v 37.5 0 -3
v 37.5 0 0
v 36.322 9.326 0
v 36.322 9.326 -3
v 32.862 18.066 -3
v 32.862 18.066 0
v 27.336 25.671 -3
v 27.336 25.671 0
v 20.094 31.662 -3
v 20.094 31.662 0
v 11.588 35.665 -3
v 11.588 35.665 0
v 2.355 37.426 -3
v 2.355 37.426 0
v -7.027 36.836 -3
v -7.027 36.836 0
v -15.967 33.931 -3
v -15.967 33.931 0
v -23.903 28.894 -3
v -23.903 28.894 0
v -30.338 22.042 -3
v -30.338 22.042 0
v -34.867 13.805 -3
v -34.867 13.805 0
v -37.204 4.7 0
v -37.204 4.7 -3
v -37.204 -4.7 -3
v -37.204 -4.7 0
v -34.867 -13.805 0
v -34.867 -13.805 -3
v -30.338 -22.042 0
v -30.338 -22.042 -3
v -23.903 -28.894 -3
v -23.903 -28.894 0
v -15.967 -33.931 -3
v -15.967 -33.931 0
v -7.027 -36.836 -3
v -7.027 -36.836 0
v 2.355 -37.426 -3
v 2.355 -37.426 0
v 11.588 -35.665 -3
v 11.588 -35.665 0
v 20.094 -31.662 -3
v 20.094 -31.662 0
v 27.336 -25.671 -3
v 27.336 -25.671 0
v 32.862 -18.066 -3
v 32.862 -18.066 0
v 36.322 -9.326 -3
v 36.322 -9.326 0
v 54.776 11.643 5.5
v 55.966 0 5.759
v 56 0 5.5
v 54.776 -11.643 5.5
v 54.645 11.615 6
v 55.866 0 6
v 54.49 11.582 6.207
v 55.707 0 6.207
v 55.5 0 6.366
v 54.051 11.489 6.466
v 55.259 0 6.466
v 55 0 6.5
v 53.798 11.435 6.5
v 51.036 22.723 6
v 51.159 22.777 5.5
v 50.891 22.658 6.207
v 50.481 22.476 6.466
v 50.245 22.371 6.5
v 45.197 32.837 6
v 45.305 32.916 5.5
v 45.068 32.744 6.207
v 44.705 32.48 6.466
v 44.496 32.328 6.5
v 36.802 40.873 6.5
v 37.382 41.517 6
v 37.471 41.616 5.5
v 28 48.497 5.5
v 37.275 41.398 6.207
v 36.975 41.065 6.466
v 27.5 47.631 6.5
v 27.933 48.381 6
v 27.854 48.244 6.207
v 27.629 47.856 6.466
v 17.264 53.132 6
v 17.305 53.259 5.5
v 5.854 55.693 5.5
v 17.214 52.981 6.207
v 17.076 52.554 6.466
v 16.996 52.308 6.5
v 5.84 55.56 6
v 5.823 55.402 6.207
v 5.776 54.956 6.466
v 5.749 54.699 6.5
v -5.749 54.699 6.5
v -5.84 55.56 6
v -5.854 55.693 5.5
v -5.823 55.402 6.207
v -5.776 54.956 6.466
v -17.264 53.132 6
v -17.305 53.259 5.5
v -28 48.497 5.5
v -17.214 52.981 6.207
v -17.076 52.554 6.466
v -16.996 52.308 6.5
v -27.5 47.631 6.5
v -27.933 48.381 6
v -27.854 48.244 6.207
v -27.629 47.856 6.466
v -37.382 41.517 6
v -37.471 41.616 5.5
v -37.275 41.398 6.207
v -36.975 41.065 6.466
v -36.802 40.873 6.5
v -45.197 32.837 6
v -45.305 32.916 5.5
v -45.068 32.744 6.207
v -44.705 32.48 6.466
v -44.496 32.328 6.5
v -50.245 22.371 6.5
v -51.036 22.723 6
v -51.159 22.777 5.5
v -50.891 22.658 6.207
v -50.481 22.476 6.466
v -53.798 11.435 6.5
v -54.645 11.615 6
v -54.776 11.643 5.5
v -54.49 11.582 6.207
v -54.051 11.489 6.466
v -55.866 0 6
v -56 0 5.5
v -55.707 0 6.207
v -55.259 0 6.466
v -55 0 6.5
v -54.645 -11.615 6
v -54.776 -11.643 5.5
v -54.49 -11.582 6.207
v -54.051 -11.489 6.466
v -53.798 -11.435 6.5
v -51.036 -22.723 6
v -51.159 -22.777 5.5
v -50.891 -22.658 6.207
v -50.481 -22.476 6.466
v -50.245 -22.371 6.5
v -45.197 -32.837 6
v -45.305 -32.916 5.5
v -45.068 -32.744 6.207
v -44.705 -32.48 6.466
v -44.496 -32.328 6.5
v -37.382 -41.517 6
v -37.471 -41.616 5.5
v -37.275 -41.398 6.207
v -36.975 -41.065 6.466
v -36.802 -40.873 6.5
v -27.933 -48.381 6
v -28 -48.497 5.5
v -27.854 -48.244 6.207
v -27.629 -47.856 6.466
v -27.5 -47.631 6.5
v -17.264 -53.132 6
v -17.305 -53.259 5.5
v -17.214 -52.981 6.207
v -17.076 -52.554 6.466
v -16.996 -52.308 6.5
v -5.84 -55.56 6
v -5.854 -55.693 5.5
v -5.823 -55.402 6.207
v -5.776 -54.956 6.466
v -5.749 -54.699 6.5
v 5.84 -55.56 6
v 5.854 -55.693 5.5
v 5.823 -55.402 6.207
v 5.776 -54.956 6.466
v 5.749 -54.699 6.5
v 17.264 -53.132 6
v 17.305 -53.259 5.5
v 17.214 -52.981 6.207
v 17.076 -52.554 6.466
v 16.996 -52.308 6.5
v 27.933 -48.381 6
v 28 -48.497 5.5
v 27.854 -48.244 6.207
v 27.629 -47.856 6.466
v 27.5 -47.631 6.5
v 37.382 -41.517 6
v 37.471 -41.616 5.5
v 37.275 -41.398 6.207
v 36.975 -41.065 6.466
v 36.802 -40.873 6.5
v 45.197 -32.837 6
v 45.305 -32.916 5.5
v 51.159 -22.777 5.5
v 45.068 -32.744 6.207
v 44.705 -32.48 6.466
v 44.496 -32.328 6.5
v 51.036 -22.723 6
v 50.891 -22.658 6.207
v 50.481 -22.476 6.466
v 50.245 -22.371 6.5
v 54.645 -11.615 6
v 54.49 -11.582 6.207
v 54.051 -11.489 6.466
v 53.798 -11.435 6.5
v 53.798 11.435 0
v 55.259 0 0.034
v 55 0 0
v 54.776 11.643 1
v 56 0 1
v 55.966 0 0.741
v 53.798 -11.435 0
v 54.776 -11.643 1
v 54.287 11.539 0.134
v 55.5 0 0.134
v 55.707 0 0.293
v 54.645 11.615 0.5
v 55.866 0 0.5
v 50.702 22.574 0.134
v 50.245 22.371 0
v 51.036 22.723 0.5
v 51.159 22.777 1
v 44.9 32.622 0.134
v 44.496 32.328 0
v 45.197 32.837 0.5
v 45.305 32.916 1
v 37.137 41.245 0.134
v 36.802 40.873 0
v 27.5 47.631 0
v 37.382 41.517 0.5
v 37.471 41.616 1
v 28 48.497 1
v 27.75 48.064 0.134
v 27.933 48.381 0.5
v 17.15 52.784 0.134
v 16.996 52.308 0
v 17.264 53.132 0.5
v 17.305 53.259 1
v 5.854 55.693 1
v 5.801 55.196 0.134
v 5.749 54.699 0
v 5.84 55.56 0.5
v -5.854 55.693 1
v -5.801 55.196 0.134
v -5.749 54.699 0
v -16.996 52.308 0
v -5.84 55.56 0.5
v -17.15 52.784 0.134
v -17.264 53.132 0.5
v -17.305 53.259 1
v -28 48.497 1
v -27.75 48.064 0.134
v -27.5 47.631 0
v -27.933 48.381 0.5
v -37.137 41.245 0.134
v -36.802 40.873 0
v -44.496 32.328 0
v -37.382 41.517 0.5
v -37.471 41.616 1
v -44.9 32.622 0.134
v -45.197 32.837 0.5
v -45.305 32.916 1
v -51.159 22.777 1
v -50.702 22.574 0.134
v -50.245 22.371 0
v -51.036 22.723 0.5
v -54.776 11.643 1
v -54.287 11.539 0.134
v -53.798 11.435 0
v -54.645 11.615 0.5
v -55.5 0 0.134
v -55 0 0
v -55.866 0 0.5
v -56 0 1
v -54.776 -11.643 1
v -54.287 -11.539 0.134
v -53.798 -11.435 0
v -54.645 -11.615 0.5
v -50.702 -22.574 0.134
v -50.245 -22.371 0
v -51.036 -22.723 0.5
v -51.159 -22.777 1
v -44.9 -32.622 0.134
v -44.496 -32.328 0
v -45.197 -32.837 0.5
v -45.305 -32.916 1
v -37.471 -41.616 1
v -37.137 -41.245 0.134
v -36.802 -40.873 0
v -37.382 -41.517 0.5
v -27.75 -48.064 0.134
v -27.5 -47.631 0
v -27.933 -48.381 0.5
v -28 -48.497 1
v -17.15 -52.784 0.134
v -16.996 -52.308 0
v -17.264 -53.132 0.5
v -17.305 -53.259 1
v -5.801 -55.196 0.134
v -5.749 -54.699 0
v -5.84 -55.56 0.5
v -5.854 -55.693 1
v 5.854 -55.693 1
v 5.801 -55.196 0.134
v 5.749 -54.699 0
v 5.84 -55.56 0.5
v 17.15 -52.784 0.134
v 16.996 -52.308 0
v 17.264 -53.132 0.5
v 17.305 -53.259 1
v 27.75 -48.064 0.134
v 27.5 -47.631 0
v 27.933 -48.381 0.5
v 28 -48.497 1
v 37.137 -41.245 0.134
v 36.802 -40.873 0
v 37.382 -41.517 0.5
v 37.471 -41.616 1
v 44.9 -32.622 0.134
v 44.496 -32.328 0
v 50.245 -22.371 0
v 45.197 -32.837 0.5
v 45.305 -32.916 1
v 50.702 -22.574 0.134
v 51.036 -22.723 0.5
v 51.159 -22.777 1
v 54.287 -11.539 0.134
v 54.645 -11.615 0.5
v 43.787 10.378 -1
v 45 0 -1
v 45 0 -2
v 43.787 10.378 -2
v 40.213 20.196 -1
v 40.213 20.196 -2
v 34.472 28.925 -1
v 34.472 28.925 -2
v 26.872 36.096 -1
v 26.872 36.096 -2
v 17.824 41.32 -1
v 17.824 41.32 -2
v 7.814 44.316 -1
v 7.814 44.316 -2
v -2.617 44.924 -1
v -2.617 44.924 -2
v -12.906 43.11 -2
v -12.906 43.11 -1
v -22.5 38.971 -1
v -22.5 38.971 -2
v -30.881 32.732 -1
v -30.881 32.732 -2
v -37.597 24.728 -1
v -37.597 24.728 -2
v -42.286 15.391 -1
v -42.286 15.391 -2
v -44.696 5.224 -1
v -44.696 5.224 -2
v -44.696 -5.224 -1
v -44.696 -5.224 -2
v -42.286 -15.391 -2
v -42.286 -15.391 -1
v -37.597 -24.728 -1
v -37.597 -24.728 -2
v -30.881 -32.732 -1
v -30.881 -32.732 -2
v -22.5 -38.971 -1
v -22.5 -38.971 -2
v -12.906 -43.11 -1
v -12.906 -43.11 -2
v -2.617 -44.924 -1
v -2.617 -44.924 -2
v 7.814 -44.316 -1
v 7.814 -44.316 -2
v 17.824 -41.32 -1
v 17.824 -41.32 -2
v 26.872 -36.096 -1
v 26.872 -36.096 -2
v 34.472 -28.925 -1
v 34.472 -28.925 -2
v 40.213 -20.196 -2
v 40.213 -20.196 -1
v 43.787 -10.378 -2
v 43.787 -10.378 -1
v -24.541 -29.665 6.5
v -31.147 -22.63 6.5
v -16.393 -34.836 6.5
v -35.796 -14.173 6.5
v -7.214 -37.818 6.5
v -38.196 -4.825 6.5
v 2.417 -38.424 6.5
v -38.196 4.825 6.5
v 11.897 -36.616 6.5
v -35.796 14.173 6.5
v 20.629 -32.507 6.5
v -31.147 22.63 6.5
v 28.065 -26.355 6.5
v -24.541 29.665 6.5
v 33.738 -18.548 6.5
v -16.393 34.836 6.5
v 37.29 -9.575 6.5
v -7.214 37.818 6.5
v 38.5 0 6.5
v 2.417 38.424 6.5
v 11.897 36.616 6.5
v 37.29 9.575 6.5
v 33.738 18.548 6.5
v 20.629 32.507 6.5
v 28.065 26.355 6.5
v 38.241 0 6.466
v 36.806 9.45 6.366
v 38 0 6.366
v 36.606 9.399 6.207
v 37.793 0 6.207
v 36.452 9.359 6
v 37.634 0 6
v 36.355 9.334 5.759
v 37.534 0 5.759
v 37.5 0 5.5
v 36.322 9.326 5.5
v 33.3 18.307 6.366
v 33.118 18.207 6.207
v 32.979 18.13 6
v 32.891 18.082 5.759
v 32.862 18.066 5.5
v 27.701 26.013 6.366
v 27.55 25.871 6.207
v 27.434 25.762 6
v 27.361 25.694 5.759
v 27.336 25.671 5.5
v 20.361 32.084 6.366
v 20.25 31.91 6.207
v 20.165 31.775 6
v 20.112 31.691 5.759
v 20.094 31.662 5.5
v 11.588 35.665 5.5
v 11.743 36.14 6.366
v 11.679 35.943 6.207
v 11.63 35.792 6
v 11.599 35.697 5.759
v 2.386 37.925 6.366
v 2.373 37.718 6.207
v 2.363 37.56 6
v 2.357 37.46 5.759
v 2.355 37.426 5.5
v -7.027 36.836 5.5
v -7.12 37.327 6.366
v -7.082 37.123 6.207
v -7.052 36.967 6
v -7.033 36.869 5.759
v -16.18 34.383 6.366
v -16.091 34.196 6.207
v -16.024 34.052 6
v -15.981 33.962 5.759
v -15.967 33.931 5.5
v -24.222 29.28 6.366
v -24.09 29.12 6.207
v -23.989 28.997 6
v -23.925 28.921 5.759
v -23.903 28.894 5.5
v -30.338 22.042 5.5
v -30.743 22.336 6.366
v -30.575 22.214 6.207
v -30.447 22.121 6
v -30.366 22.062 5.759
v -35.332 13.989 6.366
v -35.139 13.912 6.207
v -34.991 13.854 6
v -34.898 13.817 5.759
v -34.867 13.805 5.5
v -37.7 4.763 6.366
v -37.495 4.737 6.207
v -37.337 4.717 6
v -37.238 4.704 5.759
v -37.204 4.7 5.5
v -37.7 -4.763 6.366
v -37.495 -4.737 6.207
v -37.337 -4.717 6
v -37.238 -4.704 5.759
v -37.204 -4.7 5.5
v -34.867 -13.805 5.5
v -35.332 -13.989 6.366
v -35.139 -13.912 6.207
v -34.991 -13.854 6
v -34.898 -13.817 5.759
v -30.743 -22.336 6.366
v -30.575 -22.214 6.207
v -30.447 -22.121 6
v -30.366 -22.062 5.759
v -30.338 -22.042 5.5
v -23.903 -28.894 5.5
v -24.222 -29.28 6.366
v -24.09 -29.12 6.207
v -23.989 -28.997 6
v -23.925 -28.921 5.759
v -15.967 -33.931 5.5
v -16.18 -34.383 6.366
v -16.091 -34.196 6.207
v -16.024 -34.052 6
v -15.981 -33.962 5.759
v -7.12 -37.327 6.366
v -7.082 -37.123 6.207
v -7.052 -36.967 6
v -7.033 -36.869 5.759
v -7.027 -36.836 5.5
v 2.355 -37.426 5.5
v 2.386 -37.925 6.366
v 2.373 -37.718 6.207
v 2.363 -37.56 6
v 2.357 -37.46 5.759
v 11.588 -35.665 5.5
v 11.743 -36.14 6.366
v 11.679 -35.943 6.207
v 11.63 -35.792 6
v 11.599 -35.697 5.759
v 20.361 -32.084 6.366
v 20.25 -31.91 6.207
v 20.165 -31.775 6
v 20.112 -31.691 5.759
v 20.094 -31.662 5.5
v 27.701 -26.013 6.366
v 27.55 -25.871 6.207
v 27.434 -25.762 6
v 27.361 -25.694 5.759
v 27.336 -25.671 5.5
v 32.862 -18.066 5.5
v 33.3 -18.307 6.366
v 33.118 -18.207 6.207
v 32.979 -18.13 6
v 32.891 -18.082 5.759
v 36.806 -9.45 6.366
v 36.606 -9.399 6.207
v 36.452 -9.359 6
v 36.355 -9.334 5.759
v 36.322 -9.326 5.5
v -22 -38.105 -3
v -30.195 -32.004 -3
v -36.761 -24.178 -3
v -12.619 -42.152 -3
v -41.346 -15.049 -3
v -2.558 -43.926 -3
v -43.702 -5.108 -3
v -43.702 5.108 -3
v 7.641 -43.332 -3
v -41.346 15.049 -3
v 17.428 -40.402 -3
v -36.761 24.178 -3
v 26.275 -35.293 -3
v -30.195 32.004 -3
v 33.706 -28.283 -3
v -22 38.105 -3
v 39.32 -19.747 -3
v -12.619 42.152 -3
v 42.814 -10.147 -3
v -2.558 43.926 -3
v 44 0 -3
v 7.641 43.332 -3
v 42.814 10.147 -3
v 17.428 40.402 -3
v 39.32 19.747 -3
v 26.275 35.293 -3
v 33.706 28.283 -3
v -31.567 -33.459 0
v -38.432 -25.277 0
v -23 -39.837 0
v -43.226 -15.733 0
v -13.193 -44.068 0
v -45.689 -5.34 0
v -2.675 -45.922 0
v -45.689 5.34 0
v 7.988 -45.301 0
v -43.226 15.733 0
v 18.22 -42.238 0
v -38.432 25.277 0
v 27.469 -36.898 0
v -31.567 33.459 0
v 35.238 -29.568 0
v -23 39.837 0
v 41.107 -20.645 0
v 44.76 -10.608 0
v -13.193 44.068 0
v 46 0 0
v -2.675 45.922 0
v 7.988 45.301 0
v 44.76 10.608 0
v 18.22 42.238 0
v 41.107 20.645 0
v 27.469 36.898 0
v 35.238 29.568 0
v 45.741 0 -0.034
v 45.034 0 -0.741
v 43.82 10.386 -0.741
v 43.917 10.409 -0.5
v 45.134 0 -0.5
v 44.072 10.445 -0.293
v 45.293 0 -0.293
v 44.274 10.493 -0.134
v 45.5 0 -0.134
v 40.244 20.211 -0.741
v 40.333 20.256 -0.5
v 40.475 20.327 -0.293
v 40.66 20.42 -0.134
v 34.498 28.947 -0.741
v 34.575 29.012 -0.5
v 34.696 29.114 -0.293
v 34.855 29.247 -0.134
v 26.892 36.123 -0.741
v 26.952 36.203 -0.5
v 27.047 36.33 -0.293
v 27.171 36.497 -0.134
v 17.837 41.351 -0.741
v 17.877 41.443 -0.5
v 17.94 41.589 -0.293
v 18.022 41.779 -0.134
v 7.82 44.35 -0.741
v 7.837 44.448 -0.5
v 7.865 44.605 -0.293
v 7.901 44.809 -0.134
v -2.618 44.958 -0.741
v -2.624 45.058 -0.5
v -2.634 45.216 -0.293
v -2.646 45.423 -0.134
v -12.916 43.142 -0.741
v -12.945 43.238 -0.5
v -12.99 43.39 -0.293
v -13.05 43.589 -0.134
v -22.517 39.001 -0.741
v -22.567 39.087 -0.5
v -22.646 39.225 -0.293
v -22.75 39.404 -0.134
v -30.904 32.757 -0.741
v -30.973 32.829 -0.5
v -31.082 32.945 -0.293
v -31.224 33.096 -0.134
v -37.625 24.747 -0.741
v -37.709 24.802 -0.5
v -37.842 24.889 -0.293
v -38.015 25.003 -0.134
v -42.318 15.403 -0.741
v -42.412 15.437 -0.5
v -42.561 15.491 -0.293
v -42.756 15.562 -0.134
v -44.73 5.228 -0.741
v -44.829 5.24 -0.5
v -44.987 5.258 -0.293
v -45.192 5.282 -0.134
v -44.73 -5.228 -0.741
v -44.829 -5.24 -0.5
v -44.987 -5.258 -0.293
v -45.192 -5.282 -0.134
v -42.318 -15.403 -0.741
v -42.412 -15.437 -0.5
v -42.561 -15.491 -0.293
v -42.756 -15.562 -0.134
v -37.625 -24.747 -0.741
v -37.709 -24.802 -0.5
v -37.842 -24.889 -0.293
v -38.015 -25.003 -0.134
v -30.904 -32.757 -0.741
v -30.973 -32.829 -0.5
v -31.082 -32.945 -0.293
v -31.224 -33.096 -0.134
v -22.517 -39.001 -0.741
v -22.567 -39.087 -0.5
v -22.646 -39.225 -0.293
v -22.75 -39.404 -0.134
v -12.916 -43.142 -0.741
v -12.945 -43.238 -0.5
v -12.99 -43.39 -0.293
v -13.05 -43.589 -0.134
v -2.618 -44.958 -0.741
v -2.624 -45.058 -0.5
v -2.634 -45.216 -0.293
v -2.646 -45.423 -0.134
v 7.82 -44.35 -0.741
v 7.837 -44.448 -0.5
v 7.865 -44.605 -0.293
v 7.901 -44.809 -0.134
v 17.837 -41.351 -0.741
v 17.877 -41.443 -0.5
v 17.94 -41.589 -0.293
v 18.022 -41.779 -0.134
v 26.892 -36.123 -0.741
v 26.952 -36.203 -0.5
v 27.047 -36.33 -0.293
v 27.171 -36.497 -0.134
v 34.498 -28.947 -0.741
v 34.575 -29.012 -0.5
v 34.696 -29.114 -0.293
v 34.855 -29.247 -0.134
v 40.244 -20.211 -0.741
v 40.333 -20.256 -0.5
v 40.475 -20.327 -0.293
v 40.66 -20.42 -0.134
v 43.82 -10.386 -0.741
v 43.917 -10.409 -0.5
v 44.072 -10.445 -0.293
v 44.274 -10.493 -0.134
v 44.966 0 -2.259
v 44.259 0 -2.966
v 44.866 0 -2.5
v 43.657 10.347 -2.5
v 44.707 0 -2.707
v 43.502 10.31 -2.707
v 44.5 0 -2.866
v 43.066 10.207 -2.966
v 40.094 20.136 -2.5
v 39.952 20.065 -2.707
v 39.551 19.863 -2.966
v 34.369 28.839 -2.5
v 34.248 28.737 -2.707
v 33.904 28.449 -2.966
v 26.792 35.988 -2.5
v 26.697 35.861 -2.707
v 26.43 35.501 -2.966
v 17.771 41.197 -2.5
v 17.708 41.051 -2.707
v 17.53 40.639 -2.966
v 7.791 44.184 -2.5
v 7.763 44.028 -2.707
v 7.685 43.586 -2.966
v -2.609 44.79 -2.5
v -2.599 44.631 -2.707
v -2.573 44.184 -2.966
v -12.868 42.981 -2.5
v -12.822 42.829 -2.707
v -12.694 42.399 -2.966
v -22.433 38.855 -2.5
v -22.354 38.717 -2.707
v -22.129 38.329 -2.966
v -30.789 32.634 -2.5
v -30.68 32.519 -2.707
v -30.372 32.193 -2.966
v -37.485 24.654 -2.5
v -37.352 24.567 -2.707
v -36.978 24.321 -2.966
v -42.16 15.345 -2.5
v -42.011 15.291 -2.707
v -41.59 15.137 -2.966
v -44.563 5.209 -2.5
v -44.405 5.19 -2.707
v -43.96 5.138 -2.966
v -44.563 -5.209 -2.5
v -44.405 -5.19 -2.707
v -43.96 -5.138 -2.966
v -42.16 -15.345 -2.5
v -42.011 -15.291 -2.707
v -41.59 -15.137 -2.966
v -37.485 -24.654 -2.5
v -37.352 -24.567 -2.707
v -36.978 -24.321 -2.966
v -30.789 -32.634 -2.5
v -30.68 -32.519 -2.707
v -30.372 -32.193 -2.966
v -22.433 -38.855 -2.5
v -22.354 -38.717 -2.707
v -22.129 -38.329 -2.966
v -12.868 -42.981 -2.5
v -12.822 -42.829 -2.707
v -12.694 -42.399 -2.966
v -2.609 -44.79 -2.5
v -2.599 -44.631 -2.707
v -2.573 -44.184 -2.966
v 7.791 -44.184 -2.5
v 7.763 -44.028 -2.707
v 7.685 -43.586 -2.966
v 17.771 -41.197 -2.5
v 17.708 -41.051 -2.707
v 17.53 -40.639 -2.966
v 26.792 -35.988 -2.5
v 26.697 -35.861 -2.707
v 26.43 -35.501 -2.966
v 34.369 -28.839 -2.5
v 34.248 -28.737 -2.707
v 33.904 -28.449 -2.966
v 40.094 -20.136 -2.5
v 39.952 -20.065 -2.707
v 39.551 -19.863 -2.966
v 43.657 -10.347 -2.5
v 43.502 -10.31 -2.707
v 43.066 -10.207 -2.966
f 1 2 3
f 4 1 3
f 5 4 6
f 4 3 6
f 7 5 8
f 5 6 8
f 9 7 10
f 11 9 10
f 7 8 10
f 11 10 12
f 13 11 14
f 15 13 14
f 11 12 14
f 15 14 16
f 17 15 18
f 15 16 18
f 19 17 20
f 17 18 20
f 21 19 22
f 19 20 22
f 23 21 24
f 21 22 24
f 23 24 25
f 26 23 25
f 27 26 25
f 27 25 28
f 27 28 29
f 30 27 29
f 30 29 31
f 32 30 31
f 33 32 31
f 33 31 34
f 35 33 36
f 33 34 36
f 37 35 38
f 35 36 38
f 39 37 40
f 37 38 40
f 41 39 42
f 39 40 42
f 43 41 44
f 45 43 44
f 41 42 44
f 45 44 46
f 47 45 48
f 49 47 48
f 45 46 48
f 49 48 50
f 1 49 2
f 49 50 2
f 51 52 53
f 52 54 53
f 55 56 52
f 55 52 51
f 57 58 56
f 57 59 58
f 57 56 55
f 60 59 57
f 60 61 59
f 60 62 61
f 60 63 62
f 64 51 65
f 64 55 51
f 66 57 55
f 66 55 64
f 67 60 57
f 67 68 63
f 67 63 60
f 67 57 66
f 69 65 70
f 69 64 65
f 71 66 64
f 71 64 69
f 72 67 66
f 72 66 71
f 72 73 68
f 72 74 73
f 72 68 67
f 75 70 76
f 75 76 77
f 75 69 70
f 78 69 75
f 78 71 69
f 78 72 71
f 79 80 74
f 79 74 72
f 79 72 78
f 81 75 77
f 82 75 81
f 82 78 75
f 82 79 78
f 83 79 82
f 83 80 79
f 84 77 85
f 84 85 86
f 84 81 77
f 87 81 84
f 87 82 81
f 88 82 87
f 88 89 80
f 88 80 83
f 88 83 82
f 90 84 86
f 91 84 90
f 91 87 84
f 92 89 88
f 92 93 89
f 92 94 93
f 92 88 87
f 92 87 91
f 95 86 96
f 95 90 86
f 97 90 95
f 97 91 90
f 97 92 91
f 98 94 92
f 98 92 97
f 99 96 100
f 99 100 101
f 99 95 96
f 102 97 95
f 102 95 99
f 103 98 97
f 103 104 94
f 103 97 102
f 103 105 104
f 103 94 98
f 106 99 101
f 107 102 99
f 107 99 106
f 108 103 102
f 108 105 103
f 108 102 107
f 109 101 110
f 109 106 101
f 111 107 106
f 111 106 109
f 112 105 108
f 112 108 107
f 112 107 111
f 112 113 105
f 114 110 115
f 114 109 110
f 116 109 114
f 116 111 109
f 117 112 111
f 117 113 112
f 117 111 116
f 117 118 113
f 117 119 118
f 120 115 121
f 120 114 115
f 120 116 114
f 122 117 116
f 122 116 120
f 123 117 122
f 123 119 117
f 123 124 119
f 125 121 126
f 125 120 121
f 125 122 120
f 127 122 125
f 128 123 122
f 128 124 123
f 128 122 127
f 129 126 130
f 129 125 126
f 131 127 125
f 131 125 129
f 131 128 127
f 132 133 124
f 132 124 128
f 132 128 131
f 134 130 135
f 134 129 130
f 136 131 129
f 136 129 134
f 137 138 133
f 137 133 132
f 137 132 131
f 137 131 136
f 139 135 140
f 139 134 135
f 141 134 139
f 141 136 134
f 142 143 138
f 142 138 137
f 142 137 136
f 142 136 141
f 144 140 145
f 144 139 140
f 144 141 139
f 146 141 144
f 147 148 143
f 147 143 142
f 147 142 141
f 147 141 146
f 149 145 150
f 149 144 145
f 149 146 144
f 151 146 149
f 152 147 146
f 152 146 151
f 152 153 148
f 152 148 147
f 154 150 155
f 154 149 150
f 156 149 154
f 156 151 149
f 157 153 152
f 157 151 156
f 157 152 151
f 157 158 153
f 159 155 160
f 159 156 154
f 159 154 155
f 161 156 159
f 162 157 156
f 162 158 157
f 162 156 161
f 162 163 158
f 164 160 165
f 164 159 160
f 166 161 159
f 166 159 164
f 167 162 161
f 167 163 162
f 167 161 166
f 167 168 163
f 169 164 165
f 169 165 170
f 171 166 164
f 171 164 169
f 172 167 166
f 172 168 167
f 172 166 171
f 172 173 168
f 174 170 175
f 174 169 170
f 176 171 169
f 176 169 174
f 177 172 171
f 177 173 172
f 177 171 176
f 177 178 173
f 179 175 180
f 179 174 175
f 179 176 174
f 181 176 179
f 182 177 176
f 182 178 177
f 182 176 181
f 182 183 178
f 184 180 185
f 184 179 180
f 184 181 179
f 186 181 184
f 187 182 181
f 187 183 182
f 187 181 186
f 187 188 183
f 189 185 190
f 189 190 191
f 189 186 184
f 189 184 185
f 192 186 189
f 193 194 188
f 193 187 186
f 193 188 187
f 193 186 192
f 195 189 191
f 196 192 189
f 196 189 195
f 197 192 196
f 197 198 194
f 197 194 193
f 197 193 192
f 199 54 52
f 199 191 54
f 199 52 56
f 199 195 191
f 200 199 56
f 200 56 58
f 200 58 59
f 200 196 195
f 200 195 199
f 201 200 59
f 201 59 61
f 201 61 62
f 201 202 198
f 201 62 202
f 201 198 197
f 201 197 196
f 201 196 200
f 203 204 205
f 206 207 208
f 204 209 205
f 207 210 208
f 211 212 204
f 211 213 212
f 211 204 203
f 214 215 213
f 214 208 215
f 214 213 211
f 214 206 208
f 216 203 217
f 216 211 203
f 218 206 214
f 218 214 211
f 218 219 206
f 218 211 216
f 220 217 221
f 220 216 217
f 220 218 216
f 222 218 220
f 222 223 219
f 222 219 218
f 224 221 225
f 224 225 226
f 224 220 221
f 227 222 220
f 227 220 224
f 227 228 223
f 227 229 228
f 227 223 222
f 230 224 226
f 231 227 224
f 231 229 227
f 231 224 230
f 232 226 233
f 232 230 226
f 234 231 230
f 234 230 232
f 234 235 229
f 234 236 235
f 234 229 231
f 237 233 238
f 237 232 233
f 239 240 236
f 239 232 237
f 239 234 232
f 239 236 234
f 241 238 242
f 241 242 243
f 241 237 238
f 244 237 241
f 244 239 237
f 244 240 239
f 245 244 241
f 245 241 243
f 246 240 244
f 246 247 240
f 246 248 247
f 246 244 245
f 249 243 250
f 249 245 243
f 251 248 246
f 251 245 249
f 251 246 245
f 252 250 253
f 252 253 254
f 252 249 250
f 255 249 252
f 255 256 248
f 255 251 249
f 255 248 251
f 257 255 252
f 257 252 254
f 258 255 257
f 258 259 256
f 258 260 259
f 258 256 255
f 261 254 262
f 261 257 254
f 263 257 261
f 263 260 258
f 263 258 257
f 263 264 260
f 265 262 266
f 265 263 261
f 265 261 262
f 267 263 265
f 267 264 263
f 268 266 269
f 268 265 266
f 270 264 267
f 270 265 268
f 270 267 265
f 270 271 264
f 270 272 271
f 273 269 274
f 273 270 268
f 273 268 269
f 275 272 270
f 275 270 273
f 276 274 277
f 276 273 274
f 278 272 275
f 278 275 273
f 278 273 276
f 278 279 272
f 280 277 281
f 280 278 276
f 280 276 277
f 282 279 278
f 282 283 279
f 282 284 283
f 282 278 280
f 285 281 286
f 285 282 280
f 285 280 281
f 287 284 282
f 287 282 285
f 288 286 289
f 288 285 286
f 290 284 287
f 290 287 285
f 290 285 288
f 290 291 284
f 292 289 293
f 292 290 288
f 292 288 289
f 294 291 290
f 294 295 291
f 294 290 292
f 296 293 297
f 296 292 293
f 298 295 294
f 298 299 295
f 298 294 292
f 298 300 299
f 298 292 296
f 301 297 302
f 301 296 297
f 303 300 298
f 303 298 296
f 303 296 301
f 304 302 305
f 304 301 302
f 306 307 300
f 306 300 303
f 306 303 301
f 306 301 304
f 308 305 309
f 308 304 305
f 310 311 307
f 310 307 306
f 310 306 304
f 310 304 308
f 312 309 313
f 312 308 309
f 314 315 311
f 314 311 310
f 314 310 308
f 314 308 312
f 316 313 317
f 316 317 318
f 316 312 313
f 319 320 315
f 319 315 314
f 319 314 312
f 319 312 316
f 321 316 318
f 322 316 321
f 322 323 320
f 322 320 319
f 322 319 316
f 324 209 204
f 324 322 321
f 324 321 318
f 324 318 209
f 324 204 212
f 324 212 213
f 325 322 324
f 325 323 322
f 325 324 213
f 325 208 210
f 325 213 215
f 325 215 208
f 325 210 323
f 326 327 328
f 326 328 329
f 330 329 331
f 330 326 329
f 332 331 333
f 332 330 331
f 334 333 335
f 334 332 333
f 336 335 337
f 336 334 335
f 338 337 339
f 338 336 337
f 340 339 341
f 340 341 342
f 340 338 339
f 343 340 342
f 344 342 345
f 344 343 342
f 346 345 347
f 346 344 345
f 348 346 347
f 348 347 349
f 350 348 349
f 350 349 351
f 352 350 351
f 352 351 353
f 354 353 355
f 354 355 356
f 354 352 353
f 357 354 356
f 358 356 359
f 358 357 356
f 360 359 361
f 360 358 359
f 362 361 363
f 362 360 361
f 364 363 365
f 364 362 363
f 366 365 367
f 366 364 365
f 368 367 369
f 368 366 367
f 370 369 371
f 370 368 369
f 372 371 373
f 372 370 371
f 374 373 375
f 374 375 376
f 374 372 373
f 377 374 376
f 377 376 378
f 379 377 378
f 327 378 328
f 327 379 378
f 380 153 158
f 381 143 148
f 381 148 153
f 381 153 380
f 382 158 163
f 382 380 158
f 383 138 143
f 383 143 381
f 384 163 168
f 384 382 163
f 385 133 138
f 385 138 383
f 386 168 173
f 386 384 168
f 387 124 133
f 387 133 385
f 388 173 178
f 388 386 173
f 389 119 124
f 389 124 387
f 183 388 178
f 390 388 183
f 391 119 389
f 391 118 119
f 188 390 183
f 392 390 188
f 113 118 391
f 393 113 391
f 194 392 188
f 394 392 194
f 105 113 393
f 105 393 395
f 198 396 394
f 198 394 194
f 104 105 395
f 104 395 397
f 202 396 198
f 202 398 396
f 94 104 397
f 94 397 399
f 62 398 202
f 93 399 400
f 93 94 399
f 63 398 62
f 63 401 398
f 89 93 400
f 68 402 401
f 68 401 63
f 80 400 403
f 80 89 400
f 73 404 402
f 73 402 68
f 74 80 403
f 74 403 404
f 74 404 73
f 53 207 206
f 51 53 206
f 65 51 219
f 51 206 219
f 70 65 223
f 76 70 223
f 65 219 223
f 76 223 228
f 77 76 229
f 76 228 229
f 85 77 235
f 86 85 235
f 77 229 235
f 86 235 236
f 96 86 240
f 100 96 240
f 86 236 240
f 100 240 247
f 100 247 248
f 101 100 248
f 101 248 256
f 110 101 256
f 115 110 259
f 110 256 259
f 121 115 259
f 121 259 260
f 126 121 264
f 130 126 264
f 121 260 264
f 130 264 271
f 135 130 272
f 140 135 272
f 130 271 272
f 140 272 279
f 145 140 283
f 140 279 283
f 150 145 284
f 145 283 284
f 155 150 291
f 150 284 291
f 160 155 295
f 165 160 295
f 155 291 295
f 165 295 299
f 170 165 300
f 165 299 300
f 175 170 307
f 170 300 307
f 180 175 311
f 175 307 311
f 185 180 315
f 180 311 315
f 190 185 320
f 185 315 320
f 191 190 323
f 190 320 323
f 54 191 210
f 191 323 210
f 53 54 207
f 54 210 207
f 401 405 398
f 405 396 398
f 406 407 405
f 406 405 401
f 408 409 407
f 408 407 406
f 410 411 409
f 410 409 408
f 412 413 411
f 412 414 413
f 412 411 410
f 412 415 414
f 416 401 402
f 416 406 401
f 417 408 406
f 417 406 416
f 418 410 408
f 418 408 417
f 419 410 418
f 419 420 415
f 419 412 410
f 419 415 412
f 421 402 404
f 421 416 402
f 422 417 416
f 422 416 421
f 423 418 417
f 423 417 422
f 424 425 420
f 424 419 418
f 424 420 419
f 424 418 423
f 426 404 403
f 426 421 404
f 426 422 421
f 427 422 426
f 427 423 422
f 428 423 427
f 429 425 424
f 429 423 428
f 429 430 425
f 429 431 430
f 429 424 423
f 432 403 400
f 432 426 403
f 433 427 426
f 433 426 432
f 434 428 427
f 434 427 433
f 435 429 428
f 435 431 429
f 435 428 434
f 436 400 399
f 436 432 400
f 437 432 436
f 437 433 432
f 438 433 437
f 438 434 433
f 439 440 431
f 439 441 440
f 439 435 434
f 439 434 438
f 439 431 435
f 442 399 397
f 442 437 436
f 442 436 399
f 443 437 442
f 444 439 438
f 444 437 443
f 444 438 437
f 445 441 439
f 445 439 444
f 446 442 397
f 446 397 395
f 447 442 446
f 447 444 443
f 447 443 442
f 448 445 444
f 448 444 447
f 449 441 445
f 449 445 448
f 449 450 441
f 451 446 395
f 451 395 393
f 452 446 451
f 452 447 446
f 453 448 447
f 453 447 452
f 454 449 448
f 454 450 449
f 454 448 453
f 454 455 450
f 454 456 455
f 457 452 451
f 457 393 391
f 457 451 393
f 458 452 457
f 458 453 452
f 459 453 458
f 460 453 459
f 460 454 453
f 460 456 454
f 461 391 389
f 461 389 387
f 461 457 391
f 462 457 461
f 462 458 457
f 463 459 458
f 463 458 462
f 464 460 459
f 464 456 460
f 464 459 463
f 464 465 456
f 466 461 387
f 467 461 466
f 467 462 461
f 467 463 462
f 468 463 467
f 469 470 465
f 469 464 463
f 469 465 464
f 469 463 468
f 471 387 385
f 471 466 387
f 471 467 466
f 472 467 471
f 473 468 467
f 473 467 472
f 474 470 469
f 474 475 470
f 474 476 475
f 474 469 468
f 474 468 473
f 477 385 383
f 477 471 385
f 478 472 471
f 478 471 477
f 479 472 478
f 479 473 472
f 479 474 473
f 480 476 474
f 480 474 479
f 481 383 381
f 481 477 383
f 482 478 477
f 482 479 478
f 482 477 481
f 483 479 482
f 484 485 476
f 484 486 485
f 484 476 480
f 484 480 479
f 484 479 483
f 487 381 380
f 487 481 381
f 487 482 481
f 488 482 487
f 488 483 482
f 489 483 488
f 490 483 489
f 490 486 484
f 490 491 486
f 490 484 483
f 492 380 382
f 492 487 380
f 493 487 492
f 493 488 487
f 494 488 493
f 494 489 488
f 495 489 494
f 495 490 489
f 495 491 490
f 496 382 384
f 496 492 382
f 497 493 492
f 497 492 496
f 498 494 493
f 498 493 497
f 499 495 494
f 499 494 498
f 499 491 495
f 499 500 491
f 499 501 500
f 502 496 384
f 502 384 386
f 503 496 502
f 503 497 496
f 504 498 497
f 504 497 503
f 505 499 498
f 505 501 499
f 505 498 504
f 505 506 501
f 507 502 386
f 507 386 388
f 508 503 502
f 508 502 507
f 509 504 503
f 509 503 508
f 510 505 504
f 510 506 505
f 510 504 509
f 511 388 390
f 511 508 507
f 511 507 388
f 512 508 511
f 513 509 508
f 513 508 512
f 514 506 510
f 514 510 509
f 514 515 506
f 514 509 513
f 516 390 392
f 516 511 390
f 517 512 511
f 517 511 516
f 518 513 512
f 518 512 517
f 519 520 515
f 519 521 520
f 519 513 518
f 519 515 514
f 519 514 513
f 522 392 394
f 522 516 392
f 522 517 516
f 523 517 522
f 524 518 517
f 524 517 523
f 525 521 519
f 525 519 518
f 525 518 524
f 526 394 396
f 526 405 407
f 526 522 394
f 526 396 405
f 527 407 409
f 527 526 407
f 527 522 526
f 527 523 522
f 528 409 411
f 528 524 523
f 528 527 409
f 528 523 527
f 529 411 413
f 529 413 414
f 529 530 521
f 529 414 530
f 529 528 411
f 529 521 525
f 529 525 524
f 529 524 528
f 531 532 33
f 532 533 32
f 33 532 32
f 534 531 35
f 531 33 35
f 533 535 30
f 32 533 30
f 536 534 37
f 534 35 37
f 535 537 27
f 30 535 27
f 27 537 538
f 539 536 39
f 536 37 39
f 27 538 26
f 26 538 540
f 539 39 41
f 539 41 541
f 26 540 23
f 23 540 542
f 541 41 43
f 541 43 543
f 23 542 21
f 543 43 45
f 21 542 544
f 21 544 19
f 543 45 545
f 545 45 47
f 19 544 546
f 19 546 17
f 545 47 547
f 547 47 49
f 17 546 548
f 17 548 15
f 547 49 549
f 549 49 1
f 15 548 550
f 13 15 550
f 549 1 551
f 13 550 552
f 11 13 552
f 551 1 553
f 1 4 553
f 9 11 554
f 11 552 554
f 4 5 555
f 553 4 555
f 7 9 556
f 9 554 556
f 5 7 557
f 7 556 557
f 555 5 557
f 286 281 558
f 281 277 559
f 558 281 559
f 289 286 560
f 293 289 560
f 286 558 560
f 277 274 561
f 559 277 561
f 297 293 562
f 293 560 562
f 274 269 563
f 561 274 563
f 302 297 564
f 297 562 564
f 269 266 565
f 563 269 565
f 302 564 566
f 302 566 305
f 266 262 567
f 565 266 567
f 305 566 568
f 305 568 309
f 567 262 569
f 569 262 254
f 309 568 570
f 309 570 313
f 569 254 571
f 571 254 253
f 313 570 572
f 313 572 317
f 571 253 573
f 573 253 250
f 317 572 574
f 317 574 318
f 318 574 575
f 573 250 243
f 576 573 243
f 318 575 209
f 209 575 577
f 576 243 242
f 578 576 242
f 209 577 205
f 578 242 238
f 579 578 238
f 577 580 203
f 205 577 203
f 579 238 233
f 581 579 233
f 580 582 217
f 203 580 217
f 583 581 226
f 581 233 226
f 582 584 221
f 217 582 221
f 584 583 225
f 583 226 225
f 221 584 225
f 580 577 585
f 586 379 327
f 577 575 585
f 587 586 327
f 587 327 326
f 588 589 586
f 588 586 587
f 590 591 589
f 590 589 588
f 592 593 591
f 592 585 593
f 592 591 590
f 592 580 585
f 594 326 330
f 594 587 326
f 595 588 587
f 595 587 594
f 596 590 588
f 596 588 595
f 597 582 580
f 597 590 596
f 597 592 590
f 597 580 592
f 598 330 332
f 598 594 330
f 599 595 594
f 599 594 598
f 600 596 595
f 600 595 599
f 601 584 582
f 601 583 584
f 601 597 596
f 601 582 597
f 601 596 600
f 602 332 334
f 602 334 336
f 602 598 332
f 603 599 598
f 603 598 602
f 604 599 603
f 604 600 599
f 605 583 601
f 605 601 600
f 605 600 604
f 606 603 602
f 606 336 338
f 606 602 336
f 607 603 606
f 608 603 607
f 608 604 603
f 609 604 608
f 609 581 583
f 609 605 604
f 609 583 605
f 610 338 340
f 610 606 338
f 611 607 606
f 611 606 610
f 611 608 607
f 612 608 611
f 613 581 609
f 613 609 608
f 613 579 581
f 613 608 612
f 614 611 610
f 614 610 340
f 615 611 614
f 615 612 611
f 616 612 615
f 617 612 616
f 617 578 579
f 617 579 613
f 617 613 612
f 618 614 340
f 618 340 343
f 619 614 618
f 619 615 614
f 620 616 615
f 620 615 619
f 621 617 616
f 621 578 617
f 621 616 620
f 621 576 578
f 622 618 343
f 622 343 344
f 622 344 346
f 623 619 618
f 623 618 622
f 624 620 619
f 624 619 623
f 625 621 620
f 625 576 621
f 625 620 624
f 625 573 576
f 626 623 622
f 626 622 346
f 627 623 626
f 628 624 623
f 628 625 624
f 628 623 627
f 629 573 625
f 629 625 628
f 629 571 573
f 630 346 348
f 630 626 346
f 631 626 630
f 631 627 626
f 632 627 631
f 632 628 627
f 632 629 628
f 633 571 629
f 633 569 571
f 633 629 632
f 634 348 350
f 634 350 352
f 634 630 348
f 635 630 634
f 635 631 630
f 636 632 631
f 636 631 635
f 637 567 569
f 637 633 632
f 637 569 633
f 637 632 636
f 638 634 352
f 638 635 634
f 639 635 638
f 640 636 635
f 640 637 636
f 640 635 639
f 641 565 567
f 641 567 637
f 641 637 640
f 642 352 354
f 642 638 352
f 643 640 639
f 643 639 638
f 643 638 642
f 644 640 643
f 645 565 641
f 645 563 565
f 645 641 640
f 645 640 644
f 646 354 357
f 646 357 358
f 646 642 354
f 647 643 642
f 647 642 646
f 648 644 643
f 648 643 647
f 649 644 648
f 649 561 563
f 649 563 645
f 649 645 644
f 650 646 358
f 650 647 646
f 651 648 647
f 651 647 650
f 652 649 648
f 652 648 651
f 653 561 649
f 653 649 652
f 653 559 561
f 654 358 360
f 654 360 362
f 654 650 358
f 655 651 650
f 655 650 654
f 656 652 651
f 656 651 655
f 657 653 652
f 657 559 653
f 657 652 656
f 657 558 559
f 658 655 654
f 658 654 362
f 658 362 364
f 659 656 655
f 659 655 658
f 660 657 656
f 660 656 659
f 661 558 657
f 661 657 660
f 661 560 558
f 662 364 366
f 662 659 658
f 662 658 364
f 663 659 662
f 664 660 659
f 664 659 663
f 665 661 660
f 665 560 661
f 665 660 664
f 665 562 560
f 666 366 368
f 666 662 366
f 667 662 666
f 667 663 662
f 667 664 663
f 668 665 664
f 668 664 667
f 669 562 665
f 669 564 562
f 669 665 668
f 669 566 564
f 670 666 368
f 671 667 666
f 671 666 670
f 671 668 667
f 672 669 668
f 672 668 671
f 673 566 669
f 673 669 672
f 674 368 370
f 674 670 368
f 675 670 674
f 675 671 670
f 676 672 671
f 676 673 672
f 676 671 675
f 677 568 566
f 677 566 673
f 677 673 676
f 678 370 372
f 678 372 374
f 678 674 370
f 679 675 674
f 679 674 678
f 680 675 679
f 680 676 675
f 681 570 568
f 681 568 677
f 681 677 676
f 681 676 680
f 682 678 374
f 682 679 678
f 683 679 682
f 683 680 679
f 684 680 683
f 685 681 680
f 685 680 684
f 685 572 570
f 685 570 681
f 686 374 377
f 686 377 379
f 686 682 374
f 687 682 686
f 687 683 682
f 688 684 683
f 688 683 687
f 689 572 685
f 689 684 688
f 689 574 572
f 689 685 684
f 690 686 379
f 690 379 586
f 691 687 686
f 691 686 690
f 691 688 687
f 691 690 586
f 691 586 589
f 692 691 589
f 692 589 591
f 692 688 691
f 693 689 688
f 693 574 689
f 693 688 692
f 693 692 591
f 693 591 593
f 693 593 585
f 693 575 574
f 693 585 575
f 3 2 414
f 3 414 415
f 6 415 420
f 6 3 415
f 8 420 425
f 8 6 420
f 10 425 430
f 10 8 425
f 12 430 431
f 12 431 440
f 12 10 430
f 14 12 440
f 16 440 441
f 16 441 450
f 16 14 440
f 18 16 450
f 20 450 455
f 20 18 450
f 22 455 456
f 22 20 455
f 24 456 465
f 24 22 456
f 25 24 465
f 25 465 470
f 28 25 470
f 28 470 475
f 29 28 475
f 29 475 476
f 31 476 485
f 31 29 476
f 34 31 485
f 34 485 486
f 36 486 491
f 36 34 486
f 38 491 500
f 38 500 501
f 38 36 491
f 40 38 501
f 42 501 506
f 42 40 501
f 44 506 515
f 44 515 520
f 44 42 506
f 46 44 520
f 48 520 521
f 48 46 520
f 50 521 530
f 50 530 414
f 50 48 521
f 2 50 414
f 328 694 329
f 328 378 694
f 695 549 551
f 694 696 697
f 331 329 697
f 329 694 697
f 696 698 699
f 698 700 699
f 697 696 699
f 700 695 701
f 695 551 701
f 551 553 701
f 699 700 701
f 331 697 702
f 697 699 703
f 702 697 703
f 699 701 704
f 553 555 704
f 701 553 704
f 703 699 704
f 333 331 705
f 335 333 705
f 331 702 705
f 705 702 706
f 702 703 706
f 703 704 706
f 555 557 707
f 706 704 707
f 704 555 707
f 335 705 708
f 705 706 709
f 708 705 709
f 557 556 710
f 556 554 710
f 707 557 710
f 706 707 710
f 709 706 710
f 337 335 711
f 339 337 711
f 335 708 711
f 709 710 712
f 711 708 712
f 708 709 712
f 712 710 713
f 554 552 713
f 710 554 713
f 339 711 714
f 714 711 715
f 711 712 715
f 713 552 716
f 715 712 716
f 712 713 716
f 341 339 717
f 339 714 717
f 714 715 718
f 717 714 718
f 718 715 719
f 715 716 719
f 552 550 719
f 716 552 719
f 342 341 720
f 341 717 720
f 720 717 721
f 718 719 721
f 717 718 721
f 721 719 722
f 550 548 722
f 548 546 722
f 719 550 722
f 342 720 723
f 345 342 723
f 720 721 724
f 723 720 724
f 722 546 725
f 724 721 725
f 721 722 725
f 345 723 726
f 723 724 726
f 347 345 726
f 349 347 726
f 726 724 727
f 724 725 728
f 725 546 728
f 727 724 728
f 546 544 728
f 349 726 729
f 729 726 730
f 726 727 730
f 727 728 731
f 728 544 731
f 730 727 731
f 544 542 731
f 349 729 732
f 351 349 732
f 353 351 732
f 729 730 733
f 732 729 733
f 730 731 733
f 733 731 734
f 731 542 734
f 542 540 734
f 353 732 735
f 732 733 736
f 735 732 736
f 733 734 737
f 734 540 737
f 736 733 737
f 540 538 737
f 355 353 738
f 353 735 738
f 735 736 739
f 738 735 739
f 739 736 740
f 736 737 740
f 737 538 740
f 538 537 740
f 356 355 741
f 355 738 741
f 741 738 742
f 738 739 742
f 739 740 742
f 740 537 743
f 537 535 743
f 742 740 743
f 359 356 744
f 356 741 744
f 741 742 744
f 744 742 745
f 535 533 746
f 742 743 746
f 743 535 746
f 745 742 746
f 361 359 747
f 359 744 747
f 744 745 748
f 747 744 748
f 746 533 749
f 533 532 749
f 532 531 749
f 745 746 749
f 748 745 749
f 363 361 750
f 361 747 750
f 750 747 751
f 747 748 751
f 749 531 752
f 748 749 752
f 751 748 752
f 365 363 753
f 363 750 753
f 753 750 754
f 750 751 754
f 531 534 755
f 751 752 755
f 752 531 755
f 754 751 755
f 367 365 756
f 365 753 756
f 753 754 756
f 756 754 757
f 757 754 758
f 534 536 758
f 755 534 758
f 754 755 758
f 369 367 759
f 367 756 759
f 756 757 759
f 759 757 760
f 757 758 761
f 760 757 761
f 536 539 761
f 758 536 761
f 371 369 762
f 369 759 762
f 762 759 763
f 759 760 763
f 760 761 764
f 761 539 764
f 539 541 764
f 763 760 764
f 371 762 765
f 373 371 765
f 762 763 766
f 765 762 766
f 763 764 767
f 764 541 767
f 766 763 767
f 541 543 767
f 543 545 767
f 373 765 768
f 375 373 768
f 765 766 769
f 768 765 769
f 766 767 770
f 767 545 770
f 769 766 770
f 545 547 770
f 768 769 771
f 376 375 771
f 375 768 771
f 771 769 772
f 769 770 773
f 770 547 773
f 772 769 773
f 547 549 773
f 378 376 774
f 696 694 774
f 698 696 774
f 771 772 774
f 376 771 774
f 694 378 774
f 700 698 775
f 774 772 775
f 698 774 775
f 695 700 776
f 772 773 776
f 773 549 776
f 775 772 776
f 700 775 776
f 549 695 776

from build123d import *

# Parameters (mm, degrees)
F0_R     = 56
F0_R_2   = 37.5
F1_DEPTH = 6.5
F2_R     = 45
F2_R_2   = 37.5
F3_DEPTH = 3
F4_R     = 1


with BuildPart() as f1:
    # F0 (on Top) → F1 (new body)
    with BuildSketch(Plane.XY):
        Circle(F0_R)
        Circle(F0_R_2, mode=Mode.SUBTRACT)
    extrude(amount=F1_DEPTH)

    # F2 (on Top) → F3 (join)
    with BuildSketch(Plane.XY):
        Circle(F2_R)
        Circle(F2_R_2, mode=Mode.SUBTRACT)
    extrude(amount=-F3_DEPTH)

    # F4
    f4_edges = [f1.edges().sort_by_distance(p)[0] for p in [
        (-56, 0, 6.5),
        (-45, 0, -3),
        (-45, 0, 0),
        (-37.5, 0, 6.5),
        (-56, 0, 0),
    ]]
    fillet(f4_edges, radius=F4_R)


solid = f1.part
